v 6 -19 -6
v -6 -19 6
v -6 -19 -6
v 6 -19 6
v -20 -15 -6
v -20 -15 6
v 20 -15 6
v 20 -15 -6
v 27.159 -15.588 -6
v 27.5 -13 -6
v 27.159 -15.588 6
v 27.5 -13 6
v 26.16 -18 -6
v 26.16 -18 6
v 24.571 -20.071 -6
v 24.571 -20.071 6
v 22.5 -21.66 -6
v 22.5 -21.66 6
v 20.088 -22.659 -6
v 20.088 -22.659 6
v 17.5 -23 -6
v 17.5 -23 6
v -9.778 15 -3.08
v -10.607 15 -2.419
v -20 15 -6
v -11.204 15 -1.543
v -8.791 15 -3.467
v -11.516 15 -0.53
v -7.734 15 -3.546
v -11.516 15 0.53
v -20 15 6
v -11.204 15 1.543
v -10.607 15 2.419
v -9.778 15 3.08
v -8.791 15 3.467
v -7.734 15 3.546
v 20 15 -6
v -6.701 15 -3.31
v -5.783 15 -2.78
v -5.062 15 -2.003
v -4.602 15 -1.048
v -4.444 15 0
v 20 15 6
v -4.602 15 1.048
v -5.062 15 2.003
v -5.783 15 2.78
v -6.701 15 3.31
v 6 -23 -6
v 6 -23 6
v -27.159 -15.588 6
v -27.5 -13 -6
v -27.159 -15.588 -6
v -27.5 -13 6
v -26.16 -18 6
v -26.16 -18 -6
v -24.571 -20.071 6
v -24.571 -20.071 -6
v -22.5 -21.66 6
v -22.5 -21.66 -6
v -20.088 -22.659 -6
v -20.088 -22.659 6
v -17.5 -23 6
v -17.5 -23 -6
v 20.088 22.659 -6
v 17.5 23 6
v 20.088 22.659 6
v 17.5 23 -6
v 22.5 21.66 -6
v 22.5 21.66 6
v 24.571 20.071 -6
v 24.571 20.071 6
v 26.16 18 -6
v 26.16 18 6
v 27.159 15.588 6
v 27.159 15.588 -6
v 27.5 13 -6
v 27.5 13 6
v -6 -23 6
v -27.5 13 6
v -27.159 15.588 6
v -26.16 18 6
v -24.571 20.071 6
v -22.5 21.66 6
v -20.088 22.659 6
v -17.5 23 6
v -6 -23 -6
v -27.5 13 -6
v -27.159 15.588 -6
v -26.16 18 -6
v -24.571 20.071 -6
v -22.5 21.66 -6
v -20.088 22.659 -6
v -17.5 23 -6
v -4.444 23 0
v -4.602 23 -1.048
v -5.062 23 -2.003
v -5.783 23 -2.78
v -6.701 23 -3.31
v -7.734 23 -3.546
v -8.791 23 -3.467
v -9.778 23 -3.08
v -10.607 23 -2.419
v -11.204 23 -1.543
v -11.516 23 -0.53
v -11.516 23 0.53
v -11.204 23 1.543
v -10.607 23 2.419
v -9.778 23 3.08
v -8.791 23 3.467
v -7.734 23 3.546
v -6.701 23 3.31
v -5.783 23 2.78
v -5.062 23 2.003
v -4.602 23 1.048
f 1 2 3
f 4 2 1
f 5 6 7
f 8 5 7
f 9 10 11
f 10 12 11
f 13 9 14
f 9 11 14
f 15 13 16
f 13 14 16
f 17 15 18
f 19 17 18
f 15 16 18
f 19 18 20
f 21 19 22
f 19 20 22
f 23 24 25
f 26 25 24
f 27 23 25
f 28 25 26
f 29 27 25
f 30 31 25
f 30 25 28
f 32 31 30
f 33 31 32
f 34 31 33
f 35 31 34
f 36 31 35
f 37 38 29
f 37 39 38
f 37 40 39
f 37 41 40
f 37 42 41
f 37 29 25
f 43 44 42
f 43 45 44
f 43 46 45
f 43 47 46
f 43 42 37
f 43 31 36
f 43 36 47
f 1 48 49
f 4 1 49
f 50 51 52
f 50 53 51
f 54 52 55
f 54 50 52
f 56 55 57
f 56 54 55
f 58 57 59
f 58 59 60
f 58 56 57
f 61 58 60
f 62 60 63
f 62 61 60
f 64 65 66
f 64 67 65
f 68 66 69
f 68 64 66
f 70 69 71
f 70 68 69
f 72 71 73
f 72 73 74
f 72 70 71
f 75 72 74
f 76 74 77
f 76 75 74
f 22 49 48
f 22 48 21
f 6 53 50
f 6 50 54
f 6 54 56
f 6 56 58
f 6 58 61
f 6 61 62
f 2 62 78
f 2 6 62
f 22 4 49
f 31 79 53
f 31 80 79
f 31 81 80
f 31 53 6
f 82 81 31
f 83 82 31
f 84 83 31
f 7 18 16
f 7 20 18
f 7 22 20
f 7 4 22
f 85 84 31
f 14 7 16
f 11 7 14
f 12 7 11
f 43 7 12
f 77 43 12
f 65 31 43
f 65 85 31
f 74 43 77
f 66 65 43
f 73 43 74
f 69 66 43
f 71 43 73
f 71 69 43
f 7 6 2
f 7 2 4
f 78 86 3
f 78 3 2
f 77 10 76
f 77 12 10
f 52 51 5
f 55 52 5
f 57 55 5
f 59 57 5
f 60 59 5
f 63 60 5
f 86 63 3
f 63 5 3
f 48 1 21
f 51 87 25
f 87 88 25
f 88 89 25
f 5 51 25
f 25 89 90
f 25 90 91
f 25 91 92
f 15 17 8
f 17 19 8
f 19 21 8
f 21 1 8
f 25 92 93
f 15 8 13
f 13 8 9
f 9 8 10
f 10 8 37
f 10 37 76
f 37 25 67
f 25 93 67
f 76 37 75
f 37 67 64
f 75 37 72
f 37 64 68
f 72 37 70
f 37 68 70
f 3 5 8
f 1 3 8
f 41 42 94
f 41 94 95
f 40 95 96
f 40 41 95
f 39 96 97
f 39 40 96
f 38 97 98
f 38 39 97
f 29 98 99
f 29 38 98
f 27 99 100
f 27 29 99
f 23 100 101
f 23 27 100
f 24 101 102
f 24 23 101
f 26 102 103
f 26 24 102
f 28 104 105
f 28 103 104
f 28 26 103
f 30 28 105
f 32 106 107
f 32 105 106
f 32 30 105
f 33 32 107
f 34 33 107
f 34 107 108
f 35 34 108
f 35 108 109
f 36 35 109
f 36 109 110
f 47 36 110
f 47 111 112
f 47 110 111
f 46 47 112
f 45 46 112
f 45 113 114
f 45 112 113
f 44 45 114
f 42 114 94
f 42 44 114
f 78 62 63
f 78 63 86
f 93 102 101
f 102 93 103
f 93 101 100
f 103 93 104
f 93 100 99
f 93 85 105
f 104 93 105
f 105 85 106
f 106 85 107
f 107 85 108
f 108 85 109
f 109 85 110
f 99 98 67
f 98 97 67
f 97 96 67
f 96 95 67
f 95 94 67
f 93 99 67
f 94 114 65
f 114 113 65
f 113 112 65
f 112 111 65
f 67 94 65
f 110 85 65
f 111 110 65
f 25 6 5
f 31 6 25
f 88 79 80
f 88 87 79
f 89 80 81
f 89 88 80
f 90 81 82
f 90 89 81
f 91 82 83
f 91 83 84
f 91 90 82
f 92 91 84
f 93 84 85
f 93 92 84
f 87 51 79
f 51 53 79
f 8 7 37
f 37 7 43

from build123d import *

# Parameters (mm, degrees)
SKETCH1_W           = 55
SKETCH1_H           = 46
SKETCH1_W_2         = 40
SKETCH1_H_2         = 30
BOSS_EXTRUDE1_DEPTH = 6
SKETCH3_R           = 3.556
CUT_EXTRUDE1_DEPTH  = 24
SKETCH6_W           = 12
SKETCH6_H           = 12
CUT_EXTRUDE4_DEPTH  = 4
FILLET1_R           = 10


with BuildPart() as part:
    # Sketch1 → Boss-Extrude1 (new body, symmetric)
    with BuildSketch(Plane.XY):
        Rectangle(SKETCH1_W, SKETCH1_H)
        Rectangle(SKETCH1_W_2, SKETCH1_H_2, mode=Mode.SUBTRACT)
    extrude(amount=BOSS_EXTRUDE1_DEPTH, both=True)

    # Sketch3 → Cut-Extrude1 (cut, through all)
    with BuildSketch(Plane(origin=(0, 0, 0), x_dir=(1, 0, 0), z_dir=(0, 1, 0))):
        with Locations((-8, 0)):
            Circle(SKETCH3_R)
    extrude(amount=CUT_EXTRUDE1_DEPTH, mode=Mode.SUBTRACT)

    # Sketch6 → Cut-Extrude4 (cut)
    with BuildSketch(Plane.XZ.offset(23)):
        Rectangle(SKETCH6_W, SKETCH6_H)
    extrude(amount=-CUT_EXTRUDE4_DEPTH, mode=Mode.SUBTRACT)

    # Fillet1
    fillet1_edges = [part.edges().sort_by_distance(p)[0] for p in [
        (-27.5, -23, 0),
        (-27.5, 23, 0),
        (27.5, 23, 0),
        (27.5, -23, 0),
    ]]
    fillet(fillet1_edges, radius=FILLET1_R)


solid = part.part
